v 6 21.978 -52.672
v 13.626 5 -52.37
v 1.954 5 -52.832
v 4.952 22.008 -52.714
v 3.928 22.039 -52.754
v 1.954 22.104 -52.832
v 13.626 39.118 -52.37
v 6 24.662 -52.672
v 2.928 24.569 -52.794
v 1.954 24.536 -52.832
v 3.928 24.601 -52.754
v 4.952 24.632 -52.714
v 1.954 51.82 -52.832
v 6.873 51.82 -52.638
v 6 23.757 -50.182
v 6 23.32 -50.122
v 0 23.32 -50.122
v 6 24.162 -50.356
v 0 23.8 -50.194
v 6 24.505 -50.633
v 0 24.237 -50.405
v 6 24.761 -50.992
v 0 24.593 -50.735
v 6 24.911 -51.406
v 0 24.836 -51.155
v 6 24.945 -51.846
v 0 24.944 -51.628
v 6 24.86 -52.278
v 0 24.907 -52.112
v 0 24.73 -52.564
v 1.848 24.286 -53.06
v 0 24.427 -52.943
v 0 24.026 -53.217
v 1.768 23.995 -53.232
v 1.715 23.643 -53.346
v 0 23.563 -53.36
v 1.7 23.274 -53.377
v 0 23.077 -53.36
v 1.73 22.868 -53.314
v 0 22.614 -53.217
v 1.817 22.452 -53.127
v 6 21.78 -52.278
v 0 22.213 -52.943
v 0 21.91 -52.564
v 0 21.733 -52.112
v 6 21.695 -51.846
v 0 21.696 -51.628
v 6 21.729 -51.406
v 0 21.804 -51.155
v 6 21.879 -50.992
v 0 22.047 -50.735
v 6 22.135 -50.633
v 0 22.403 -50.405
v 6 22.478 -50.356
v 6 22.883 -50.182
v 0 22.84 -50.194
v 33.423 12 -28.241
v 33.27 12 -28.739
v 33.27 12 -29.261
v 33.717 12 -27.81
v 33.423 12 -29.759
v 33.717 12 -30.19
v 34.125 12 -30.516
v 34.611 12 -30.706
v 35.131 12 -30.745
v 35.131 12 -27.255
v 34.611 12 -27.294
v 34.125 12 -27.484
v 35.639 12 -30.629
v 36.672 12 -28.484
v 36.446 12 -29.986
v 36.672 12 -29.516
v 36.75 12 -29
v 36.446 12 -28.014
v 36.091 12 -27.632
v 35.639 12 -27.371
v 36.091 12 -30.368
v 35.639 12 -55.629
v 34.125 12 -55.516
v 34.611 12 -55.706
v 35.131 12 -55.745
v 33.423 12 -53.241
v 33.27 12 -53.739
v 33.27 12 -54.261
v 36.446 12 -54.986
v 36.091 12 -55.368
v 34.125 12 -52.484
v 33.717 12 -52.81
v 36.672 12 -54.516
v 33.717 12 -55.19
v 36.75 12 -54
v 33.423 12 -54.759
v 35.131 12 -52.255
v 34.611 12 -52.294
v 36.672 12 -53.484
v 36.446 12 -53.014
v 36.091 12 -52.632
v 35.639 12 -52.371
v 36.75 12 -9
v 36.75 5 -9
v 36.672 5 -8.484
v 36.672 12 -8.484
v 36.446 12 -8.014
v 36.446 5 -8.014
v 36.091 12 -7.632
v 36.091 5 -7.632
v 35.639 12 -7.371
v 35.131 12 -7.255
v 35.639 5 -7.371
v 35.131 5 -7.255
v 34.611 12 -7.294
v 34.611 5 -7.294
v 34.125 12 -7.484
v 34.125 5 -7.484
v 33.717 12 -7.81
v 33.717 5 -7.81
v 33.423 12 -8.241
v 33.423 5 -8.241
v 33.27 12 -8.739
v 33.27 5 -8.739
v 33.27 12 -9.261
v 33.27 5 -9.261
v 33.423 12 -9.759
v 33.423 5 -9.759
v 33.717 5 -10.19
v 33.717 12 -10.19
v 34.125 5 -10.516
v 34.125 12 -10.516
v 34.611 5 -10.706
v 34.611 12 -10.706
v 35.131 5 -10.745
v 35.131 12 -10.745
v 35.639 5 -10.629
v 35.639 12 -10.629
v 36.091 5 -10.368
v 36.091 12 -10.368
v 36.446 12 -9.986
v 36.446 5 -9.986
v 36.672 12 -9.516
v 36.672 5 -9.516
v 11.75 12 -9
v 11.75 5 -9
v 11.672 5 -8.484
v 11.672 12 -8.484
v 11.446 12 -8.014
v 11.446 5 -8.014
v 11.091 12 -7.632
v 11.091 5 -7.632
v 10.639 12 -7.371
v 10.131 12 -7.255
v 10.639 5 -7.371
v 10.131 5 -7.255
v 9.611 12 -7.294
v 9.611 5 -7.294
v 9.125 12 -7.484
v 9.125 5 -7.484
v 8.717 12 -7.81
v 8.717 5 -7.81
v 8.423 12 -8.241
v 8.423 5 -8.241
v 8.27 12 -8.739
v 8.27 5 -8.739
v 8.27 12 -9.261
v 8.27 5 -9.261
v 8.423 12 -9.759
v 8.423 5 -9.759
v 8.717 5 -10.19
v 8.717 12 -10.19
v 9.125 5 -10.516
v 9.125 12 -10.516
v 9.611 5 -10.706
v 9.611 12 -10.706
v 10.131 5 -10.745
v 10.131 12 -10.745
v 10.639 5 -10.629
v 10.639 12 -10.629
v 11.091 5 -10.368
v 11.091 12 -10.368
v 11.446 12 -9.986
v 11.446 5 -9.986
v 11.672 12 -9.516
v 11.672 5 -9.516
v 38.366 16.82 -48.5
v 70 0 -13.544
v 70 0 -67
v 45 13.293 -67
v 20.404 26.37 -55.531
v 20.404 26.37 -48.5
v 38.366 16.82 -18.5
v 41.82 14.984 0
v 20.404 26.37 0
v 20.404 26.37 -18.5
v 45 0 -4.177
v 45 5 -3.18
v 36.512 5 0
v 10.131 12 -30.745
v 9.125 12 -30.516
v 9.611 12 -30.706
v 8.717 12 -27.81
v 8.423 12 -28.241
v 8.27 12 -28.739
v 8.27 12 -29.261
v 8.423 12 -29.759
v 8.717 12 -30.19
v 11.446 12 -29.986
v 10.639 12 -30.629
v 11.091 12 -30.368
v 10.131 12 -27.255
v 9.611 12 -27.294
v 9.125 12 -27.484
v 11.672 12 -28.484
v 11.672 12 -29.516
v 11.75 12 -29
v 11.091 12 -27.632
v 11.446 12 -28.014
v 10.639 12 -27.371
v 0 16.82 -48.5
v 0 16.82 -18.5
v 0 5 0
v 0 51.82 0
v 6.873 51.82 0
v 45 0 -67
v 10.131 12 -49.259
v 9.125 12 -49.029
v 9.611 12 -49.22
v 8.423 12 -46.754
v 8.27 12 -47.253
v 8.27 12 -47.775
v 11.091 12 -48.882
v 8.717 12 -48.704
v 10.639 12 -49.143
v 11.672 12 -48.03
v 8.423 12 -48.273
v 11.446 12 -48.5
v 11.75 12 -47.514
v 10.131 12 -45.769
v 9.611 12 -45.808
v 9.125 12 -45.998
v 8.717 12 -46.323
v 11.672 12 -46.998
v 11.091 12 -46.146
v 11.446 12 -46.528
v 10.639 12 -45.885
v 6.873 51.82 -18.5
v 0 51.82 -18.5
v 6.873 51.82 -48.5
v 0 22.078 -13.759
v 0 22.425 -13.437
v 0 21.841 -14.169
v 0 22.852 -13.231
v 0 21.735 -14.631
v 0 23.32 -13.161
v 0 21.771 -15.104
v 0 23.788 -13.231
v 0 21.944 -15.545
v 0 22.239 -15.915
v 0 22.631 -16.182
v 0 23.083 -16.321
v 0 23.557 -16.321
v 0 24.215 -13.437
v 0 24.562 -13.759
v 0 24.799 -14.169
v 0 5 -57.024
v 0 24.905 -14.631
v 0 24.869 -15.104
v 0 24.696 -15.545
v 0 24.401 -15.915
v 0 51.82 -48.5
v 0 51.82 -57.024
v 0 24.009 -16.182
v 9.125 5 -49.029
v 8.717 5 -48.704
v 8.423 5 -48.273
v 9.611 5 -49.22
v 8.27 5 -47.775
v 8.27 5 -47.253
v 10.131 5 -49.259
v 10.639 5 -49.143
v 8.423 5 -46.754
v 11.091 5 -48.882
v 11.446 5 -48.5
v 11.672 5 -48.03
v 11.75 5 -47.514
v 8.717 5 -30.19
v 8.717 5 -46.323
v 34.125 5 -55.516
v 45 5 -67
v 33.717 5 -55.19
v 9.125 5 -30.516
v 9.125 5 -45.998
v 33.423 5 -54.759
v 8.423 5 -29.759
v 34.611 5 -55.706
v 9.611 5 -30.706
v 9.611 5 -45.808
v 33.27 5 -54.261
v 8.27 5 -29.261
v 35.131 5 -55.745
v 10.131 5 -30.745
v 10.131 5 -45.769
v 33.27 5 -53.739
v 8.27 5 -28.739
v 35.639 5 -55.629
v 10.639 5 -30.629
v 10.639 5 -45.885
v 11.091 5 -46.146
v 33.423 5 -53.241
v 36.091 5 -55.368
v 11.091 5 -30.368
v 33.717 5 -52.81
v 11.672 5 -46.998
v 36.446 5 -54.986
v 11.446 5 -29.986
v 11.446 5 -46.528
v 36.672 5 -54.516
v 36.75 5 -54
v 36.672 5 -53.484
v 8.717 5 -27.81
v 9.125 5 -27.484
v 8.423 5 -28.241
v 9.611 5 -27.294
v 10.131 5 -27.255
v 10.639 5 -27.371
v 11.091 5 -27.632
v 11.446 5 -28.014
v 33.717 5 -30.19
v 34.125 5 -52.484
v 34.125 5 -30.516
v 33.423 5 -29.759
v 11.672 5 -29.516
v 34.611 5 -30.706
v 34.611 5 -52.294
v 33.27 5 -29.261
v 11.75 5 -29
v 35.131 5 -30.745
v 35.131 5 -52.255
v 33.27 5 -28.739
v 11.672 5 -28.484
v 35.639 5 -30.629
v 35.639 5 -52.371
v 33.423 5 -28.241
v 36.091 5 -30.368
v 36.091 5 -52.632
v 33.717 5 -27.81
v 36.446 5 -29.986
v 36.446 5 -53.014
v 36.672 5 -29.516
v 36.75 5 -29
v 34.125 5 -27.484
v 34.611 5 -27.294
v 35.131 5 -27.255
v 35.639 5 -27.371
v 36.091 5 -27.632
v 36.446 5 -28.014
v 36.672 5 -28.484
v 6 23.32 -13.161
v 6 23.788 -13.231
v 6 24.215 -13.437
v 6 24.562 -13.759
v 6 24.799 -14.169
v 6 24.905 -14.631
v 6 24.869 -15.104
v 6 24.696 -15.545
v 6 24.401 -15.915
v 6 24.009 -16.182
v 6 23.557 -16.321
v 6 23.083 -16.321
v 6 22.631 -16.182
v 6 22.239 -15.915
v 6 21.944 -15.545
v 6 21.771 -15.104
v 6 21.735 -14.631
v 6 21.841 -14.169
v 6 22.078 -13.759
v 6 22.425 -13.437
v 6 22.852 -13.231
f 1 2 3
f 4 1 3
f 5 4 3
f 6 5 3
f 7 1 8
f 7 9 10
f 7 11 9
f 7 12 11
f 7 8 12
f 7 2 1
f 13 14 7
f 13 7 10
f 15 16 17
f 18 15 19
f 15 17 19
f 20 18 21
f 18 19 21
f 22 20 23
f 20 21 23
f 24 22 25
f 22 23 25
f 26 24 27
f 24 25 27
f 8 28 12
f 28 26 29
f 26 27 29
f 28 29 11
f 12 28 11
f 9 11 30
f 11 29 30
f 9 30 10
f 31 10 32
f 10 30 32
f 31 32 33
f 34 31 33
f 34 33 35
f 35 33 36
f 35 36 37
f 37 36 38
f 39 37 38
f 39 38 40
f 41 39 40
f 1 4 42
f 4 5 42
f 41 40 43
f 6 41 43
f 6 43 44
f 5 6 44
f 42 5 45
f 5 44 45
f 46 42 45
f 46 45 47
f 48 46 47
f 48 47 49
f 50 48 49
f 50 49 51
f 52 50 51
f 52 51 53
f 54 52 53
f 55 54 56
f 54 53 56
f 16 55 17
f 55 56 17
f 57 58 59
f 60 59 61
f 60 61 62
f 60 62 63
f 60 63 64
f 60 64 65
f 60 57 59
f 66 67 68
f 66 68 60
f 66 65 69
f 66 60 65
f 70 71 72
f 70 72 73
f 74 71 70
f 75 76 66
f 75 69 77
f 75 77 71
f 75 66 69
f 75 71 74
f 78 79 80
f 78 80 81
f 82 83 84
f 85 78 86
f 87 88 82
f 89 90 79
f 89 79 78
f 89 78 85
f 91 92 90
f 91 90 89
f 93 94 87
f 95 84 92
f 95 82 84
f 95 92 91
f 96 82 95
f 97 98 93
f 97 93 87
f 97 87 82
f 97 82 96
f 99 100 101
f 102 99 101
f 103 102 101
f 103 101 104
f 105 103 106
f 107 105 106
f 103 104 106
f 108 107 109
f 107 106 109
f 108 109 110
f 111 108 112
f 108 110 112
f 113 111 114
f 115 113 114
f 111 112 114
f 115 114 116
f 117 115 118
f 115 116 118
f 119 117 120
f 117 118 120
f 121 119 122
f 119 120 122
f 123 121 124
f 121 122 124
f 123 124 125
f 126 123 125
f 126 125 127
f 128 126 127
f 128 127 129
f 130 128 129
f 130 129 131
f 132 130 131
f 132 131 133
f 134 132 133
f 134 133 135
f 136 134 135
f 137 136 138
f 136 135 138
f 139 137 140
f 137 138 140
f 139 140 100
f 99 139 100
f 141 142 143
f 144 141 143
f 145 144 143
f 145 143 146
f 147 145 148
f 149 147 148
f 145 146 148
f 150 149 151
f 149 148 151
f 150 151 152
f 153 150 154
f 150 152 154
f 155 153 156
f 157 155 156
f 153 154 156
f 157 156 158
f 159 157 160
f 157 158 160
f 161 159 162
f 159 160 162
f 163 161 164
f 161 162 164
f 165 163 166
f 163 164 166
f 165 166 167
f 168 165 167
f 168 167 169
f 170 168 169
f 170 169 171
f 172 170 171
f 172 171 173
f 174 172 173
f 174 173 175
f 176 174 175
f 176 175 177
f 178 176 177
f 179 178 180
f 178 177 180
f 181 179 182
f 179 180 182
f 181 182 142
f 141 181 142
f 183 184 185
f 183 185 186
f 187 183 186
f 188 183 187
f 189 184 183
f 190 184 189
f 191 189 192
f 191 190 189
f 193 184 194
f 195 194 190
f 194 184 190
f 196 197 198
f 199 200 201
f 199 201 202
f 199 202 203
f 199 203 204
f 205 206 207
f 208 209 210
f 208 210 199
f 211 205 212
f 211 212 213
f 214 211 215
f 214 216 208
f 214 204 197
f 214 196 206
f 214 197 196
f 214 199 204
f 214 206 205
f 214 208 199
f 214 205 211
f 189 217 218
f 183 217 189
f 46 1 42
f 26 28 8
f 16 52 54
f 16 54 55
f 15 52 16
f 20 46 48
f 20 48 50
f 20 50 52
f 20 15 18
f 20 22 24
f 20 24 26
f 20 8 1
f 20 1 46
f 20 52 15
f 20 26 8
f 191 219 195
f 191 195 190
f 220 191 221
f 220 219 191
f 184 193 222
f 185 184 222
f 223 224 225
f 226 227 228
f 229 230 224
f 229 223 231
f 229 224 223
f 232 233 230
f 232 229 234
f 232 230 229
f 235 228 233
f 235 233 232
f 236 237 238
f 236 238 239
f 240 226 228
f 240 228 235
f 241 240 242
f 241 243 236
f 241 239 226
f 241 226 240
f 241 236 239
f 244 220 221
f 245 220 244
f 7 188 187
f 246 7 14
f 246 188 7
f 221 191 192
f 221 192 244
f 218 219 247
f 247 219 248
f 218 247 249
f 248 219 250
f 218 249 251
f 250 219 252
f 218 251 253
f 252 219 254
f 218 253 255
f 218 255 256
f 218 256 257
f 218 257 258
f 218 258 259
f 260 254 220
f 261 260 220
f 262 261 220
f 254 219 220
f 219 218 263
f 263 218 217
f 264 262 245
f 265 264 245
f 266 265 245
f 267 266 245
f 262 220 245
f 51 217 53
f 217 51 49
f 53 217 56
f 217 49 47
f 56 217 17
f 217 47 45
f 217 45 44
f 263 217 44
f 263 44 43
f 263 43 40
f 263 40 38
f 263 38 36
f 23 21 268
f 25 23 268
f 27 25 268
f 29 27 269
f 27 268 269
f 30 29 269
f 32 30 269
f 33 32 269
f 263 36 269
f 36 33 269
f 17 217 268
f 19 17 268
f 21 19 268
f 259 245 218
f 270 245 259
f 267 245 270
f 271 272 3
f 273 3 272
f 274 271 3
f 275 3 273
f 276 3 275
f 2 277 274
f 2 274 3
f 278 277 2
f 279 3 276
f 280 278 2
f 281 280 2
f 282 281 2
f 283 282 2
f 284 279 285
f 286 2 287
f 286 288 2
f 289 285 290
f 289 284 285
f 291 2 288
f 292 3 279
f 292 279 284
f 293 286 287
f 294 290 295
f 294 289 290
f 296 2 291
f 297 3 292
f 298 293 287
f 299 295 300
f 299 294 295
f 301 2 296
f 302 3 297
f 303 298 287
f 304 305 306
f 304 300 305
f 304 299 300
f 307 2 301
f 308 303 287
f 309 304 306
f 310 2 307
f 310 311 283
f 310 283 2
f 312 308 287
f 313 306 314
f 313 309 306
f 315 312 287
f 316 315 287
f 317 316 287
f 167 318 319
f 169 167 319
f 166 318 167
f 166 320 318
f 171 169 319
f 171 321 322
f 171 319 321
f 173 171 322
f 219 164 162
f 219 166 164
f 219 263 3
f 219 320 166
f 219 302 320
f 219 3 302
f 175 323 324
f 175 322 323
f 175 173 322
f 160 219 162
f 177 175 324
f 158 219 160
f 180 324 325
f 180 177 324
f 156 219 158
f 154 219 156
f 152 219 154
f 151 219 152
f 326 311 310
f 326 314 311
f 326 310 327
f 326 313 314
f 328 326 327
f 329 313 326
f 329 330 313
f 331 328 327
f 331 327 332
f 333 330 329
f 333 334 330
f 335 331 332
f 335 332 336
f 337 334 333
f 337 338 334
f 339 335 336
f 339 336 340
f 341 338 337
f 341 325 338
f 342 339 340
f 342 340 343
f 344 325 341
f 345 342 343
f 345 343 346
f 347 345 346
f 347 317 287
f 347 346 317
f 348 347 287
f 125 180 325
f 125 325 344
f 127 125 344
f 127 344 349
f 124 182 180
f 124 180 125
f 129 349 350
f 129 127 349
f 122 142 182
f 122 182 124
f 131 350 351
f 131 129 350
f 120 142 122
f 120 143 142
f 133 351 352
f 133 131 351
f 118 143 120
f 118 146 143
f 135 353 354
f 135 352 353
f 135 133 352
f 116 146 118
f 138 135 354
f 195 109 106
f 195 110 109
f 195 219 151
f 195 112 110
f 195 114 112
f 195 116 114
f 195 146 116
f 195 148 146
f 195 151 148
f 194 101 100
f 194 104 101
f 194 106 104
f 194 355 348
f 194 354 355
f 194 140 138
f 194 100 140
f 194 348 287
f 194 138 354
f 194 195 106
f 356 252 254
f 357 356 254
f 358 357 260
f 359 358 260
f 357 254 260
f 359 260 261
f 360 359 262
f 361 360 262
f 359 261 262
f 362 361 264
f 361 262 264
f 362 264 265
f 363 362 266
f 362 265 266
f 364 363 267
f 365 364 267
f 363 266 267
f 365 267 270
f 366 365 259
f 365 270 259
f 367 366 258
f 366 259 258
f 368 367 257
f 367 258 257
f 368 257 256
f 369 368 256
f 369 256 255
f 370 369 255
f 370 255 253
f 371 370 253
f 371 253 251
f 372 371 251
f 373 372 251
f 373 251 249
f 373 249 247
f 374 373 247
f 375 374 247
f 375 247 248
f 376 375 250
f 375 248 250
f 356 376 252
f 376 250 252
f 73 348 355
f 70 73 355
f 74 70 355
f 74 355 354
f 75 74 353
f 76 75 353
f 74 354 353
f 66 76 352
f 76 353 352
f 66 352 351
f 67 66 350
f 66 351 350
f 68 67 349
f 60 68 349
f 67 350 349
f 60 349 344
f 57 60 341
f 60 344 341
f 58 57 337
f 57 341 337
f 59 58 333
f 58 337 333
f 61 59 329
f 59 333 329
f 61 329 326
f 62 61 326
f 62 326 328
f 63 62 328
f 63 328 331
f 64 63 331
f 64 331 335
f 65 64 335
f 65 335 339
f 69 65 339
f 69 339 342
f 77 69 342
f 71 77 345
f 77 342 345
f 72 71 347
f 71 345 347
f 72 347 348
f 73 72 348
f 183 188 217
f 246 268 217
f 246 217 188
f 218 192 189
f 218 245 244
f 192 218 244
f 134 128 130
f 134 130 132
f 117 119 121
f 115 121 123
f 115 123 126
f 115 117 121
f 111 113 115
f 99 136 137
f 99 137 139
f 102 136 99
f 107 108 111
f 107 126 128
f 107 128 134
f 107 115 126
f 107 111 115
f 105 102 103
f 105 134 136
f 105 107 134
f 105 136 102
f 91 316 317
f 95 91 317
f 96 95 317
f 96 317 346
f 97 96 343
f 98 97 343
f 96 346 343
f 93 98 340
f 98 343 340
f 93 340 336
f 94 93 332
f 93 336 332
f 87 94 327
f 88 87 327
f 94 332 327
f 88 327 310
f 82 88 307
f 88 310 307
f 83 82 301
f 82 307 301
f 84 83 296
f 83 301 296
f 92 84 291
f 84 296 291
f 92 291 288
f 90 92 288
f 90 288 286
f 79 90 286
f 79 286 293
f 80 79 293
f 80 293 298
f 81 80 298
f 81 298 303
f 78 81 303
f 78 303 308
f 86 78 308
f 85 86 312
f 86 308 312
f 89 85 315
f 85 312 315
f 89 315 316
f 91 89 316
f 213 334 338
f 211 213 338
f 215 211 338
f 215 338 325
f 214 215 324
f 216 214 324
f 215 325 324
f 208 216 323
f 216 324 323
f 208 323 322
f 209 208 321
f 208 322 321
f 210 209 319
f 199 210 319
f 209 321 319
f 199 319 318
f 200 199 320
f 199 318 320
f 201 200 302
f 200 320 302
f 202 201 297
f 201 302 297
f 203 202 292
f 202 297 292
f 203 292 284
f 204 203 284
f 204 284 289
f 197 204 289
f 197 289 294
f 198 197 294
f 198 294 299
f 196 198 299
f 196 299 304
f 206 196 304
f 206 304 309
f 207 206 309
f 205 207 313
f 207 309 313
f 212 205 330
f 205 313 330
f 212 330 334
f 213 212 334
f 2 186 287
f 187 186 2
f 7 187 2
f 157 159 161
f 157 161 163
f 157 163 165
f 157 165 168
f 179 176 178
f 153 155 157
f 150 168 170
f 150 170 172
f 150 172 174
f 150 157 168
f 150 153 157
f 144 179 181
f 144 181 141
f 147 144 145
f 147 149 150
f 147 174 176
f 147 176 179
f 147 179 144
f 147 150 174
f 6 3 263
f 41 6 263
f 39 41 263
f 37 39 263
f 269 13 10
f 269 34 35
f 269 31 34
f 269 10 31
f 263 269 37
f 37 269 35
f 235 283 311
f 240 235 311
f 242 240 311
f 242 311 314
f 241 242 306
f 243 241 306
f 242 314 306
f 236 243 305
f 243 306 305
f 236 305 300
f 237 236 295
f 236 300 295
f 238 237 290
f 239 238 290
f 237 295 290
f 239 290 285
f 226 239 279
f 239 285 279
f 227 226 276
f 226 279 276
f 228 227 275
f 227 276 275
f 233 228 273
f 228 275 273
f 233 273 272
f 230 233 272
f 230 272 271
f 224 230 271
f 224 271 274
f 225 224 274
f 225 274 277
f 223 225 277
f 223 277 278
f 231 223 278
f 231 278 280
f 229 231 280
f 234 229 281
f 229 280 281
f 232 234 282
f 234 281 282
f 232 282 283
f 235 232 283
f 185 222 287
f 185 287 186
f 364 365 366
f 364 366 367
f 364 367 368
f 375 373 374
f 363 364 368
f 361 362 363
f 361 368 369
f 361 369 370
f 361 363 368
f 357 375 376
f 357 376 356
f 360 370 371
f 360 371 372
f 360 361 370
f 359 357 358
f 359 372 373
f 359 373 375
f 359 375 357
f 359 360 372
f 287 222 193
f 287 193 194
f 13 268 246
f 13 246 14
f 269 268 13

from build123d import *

# Parameters (mm, degrees)
CROQUIS1_W              = 67
CROQUIS1_H              = 51.82
SALIENTE_EXTRUIR1_DEPTH = 70
CORTAR_EXTRUIR1_REACH   = 69
CROQUIS4_W              = 60
CROQUIS4_H              = 30
CORTAR_EXTRUIR2_DEPTH   = 35
CORTAR_EXTRUIR3_REACH   = 69
CROQUIS5_W              = 45
CROQUIS5_H              = 5
CORTAR_EXTRUIR4_REACH   = 53.82
CORTAR_EXTRUIR5_REACH   = 53.82
CROQUIS11_R             = 1.589119195
CROQUIS11_R_2           = 1.628109744
CORTAR_EXTRUIR6_DEPTH   = 6
CROQUIS12_R             = 1.75
CORTAR_EXTRUIR7_DEPTH   = 7
CORTAR_EXTRUIR8_REACH   = 34.863


with BuildPart() as part:
    # Croquis1 → Saliente-Extruir1 (new body)
    with BuildSketch(Plane(origin=(0, 0, 0), x_dir=(0, 0, -1), z_dir=(1, 0, 0))):
        with Locations((33.5, 25.91)):
            Rectangle(CROQUIS1_W, CROQUIS1_H)
    extrude(amount=SALIENTE_EXTRUIR1_DEPTH)

    # Croquis3 → Cortar-Extruir1 (cut, up to next)
    with BuildSketch(Plane.XY, mode=Mode.PRIVATE) as cortar_extruir1_sk1:
        Polygon((70, 0), (20.404370982, 26.370463718), (6.872612509, 51.82), (70, 51.82), align=None)
    cortar_extruir1_tool1 = extrude(cortar_extruir1_sk1.sketch, amount=-CORTAR_EXTRUIR1_REACH, mode=Mode.PRIVATE) & part.part
    add(cortar_extruir1_tool1.solids().sort_by_distance((45.373987, 32.707801, 0))[0], mode=Mode.SUBTRACT)

    # Croquis4 → Cortar-Extruir2 (cut)
    with BuildSketch(Plane(origin=(0, 51.82, 0), x_dir=(1, 0, 0), z_dir=(0, 1, 0))):
        with Locations((30, 33.5)):
            Rectangle(CROQUIS4_W, CROQUIS4_H)
    extrude(amount=-CORTAR_EXTRUIR2_DEPTH, mode=Mode.SUBTRACT)

    # Croquis5 → Cortar-Extruir3 (cut, up to next)
    with BuildSketch(Plane.XY, mode=Mode.PRIVATE) as cortar_extruir3_sk1:
        with Locations((22.5, 2.5)):
            Rectangle(CROQUIS5_W, CROQUIS5_H)
    cortar_extruir3_tool1 = extrude(cortar_extruir3_sk1.sketch, amount=-CORTAR_EXTRUIR3_REACH, mode=Mode.PRIVATE) & part.part
    add(cortar_extruir3_tool1.solids().sort_by_distance((22.5, 2.5, 0))[0], mode=Mode.SUBTRACT)

    # Croquis6 → Cortar-Extruir4 (cut, up to next)
    with BuildSketch(Plane(origin=(0, 51.82, 0), x_dir=(1, 0, 0), z_dir=(0, 1, 0)), mode=Mode.PRIVATE) as cortar_extruir4_sk1:
        Polygon((4.922856145, 67), (0, 64.334655313), (0, 67), align=None)
    cortar_extruir4_tool1 = extrude(cortar_extruir4_sk1.sketch, amount=-CORTAR_EXTRUIR4_REACH, mode=Mode.PRIVATE) & part.part
    add(cortar_extruir4_tool1.solids().sort_by_distance((1.640952, 51.82, -66.111552))[0], mode=Mode.SUBTRACT)

    # Croquis9 → Cortar-Extruir5 (cut, up to next)
    with BuildSketch(Plane(origin=(0, 51.82, 0), x_dir=(1, 0, 0), z_dir=(0, 1, 0)), mode=Mode.PRIVATE) as cortar_extruir5_sk1:
        Polygon((45, 67), (13.626202653, 52.370158031), (1.954435626, 52.832439456), (-4.658833913, 67.014641749), align=None)
    cortar_extruir5_tool1 = extrude(cortar_extruir5_sk1.sketch, amount=-CORTAR_EXTRUIR5_REACH, mode=Mode.PRIVATE) & part.part
    add(cortar_extruir5_tool1.solids().sort_by_distance((15.368059, 51.82, -61.265598))[0], mode=Mode.SUBTRACT)

    # Croquis11 → Cortar-Extruir6 (cut)
    with BuildSketch(Plane.ZY):
        with Locations((-14.75, 23.32)):
            Circle(CROQUIS11_R)
        with Locations((-51.75, 23.32)):
            Circle(CROQUIS11_R_2)
    extrude(amount=-CORTAR_EXTRUIR6_DEPTH, mode=Mode.SUBTRACT)

    # Croquis12 → Cortar-Extruir7 (cut)
    with BuildSketch(Plane.XZ.offset(-5)):
        with Locations((10, -9)):
            Circle(CROQUIS12_R)
        with Locations((35, -9)):
            Circle(CROQUIS12_R)
        with Locations((10, -47.51378034)):
            Circle(CROQUIS12_R)
        with Locations((35, -29)):
            Circle(CROQUIS12_R)
        with Locations((10, -29)):
            Circle(CROQUIS12_R)
        with Locations((35, -54)):
            Circle(CROQUIS12_R)
    extrude(amount=-CORTAR_EXTRUIR7_DEPTH, mode=Mode.SUBTRACT)

    # Croquis14 → Cortar-Extruir8 (cut, up to next)
    with BuildSketch(Plane(origin=(15.428248379, 29.016315039, 0), x_dir=(0.882947593, -0.469471563, 0), z_dir=(0.469471563, 0.882947593, 0)), mode=Mode.PRIVATE) as cortar_extruir8_sk1:
        Polygon((25.978815345, -1.66), (66.698815345, -1.66), (66.698815345, 15.62), align=None)
    cortar_extruir8_tool1 = extrude(cortar_extruir8_sk1.sketch, amount=-CORTAR_EXTRUIR8_REACH, mode=Mode.PRIVATE) & part.part
    add(cortar_extruir8_tool1.solids().sort_by_distance((62.335265, 4.075412, -4.1))[0], mode=Mode.SUBTRACT)


solid = part.part
